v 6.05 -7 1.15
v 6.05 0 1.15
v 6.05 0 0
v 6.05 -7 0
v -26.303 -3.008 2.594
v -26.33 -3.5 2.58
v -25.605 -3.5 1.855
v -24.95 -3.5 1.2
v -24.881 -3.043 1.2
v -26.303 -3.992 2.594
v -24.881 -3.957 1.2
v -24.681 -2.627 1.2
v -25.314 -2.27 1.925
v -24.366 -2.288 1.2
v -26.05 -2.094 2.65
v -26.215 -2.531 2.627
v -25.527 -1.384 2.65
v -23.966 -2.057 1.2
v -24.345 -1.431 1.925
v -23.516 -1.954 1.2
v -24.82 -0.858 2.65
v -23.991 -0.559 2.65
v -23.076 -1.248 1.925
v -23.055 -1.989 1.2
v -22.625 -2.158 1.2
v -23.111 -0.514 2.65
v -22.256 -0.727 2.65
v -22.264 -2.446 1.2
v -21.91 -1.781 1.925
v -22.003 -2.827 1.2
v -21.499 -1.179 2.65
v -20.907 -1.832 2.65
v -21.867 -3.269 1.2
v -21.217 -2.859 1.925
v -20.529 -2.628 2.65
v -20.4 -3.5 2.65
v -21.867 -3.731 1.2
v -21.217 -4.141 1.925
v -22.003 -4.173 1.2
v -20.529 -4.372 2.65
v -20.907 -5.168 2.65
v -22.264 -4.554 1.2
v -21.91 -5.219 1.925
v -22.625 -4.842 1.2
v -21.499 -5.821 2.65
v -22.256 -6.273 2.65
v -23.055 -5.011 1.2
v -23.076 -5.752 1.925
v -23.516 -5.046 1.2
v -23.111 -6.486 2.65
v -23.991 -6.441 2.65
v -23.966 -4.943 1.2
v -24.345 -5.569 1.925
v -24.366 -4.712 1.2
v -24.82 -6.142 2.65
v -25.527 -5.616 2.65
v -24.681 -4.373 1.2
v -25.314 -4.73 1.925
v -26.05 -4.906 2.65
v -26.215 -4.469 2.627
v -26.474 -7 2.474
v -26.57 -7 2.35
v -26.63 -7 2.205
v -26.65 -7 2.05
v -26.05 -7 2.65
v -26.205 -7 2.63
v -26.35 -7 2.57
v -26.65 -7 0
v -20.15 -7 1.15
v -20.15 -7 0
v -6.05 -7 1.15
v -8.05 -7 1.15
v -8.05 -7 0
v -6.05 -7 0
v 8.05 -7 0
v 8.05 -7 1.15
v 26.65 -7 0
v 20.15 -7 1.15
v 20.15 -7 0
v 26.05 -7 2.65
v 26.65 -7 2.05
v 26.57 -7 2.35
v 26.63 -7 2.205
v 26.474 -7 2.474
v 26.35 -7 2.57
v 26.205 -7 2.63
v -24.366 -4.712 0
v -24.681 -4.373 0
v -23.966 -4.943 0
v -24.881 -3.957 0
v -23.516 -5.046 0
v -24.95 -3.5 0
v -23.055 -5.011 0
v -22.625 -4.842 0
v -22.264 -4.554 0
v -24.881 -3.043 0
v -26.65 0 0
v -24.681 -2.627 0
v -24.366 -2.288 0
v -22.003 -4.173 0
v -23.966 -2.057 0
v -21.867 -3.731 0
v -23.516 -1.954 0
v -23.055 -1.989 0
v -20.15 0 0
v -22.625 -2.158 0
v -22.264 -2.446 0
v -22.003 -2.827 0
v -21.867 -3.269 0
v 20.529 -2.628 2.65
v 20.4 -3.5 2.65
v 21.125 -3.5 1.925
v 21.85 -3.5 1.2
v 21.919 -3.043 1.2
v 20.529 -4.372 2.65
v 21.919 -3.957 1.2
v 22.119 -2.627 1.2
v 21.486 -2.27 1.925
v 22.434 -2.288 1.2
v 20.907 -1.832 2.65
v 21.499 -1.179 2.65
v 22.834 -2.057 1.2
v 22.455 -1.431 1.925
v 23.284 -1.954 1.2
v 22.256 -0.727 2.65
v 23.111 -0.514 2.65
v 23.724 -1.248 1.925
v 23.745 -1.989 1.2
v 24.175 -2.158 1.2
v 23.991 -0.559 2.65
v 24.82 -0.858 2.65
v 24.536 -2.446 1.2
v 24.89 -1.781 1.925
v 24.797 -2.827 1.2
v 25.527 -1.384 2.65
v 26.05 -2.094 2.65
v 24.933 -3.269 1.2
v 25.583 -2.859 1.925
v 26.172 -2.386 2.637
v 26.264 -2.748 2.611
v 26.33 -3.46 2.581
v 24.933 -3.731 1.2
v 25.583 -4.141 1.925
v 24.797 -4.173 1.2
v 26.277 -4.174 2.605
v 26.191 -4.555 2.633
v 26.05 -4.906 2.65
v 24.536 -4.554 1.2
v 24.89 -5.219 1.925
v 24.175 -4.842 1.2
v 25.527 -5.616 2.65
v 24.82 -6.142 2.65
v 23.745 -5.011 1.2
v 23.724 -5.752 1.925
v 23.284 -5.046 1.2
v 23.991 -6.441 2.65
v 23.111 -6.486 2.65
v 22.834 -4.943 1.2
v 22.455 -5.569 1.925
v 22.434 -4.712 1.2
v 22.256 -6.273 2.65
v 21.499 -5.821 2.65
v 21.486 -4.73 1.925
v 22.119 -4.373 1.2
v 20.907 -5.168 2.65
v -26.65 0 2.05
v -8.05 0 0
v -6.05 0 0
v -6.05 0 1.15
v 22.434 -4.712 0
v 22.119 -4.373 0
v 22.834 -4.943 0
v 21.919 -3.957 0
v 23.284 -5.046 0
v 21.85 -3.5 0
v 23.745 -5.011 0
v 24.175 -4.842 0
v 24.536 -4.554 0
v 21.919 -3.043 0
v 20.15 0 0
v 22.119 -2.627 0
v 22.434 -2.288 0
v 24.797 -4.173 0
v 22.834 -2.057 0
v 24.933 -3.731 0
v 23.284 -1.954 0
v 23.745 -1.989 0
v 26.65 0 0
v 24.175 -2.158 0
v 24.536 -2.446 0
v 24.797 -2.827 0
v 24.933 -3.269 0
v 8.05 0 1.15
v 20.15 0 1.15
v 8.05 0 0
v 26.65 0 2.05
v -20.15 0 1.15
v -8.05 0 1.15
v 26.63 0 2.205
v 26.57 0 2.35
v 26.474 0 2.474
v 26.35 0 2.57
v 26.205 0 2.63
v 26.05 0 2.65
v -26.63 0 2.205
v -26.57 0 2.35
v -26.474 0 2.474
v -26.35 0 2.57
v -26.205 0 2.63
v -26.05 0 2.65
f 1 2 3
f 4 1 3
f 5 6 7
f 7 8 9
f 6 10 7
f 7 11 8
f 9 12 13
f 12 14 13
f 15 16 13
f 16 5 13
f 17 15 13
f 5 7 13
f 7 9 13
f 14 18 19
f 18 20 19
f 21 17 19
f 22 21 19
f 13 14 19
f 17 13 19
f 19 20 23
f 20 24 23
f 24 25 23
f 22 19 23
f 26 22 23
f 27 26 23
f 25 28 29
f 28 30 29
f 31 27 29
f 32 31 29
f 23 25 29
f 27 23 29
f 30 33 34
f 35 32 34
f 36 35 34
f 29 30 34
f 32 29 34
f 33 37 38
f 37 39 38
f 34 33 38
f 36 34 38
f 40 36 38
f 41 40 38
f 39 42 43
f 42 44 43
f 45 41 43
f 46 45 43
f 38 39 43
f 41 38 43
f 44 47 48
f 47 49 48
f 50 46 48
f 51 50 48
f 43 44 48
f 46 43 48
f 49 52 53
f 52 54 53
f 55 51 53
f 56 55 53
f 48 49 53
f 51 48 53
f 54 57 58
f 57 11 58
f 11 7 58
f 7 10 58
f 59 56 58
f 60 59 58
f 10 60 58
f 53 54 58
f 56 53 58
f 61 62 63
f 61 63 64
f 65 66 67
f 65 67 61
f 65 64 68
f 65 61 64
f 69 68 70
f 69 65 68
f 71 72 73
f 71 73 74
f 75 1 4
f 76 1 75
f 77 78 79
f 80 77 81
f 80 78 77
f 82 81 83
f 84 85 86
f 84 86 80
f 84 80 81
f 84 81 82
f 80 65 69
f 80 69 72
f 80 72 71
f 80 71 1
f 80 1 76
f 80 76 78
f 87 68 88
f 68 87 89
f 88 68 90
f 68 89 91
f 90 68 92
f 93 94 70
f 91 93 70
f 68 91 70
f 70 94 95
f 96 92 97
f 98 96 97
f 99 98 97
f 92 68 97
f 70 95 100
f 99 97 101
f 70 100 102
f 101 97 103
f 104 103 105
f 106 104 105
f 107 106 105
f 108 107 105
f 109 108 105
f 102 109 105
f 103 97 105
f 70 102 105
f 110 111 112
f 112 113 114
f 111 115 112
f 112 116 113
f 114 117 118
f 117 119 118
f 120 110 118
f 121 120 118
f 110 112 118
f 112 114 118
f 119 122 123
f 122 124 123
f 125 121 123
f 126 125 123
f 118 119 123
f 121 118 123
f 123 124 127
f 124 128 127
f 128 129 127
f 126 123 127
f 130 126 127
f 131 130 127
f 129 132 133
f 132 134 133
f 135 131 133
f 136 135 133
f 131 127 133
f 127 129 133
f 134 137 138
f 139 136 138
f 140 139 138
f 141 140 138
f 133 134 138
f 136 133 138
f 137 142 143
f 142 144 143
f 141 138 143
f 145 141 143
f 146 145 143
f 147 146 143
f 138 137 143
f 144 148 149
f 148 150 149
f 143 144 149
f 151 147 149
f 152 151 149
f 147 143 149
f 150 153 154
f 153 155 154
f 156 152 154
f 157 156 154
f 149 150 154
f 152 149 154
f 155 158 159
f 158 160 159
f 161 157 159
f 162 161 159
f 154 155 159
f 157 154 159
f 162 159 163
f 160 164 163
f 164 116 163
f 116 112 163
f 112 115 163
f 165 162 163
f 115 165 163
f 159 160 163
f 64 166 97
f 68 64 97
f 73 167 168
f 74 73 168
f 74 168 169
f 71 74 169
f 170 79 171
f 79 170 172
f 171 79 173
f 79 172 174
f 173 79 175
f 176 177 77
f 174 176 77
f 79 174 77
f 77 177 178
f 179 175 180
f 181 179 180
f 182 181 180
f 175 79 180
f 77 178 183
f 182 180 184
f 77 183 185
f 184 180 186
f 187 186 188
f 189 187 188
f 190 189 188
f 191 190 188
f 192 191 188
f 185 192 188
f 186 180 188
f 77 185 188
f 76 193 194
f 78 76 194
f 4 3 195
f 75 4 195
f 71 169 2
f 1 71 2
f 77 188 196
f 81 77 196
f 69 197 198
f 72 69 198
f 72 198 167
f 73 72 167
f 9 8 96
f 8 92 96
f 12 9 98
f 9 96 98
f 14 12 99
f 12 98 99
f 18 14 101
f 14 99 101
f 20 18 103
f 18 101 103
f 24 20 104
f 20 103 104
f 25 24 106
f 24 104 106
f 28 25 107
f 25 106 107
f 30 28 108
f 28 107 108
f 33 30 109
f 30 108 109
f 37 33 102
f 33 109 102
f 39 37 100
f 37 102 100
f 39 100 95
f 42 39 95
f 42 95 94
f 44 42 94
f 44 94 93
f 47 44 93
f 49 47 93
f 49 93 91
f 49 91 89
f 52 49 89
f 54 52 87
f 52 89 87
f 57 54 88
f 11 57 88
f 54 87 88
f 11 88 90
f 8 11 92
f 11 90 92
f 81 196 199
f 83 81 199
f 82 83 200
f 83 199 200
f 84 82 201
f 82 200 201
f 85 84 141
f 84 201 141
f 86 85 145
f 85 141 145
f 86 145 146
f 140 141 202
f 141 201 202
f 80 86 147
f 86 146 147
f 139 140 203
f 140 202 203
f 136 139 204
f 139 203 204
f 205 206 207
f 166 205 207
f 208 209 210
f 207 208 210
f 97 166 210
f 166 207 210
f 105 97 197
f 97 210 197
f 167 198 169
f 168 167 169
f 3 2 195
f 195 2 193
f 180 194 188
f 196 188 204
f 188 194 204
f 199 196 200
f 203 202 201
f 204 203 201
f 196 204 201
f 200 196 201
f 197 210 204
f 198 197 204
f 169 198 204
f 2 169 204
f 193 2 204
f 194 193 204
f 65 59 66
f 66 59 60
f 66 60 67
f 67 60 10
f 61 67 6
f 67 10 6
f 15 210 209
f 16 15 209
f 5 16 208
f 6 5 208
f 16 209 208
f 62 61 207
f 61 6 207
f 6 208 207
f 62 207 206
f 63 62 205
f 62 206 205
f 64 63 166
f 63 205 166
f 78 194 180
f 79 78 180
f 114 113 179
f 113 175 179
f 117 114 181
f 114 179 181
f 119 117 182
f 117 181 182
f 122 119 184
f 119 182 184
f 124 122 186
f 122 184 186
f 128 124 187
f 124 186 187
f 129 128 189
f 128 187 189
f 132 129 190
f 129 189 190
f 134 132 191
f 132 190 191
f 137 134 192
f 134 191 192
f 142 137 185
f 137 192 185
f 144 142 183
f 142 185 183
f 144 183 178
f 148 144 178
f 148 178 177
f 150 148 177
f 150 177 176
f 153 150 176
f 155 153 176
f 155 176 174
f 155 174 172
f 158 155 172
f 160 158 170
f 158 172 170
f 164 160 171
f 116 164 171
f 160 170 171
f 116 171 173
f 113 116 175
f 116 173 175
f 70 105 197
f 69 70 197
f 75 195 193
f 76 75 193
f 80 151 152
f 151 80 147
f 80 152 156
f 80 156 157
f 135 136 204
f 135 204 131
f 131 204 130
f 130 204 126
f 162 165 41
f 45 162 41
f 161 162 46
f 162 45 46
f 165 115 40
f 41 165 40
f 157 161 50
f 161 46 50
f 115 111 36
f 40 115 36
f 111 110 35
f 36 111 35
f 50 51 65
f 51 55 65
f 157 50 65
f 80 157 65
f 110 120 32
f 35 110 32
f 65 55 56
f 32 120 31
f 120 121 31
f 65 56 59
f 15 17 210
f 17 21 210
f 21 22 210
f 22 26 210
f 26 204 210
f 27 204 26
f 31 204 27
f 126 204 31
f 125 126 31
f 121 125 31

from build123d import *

# Parameters (mm, degrees)
F2_DEPTH       = 7
F5_D           = 3.1
F5_CSINK_D     = 6
F5_CSINK_ANGLE = 90
F6_D           = 3.1
F6_CSINK_D     = 6
F6_CSINK_ANGLE = 90


with BuildPart() as f2:
    # F1 (on Front) → F2 (new body)
    with BuildSketch(Plane.XZ):
        with BuildLine():
            Line((-6.05, 1.15), (0, 1.15))
            Line((0, 1.15), (6.05, 1.15))
            Line((6.05, 1.15), (6.05, 0))
            Line((6.05, 0), (8.05, 0))
            Line((8.05, 0), (8.05, 1.15))
            Line((8.05, 1.15), (20.15, 1.15))
            Line((20.15, 1.15), (20.15, 0))
            Line((20.15, 0), (26.65, 0))
            Line((26.65, 0), (26.65, 2.05))
            ThreePointArc((26.65, 2.05), (26.4742640687, 2.4742640687), (26.05, 2.65))
            Line((26.05, 2.65), (0, 2.65))
            Line((0, 2.65), (-26.05, 2.65))
            ThreePointArc((-26.05, 2.65), (-26.4742640687, 2.4742640687), (-26.65, 2.05))
            Line((-26.65, 2.05), (-26.65, 0))
            Line((-26.65, 0), (-20.15, 0))
            Line((-20.15, 0), (-20.15, 1.15))
            Line((-20.15, 1.15), (-8.05, 1.15))
            Line((-8.05, 1.15), (-8.05, 0))
            Line((-8.05, 0), (-6.05, 0))
            Line((-6.05, 0), (-6.05, 1.15))
        make_face()
    extrude(amount=F2_DEPTH)

    # F5 (through all)
    with Locations(Plane.XY.offset(2.65)):
        with Locations((-23.4, -3.5)):
            CounterSinkHole(F5_D / 2, F5_CSINK_D / 2, counter_sink_angle=F5_CSINK_ANGLE)

    # F6 (through all)
    with Locations(Plane.XY.offset(2.65)):
        with Locations((23.4, -3.5)):
            CounterSinkHole(F6_D / 2, F6_CSINK_D / 2, counter_sink_angle=F6_CSINK_ANGLE)


solid = f2.part
